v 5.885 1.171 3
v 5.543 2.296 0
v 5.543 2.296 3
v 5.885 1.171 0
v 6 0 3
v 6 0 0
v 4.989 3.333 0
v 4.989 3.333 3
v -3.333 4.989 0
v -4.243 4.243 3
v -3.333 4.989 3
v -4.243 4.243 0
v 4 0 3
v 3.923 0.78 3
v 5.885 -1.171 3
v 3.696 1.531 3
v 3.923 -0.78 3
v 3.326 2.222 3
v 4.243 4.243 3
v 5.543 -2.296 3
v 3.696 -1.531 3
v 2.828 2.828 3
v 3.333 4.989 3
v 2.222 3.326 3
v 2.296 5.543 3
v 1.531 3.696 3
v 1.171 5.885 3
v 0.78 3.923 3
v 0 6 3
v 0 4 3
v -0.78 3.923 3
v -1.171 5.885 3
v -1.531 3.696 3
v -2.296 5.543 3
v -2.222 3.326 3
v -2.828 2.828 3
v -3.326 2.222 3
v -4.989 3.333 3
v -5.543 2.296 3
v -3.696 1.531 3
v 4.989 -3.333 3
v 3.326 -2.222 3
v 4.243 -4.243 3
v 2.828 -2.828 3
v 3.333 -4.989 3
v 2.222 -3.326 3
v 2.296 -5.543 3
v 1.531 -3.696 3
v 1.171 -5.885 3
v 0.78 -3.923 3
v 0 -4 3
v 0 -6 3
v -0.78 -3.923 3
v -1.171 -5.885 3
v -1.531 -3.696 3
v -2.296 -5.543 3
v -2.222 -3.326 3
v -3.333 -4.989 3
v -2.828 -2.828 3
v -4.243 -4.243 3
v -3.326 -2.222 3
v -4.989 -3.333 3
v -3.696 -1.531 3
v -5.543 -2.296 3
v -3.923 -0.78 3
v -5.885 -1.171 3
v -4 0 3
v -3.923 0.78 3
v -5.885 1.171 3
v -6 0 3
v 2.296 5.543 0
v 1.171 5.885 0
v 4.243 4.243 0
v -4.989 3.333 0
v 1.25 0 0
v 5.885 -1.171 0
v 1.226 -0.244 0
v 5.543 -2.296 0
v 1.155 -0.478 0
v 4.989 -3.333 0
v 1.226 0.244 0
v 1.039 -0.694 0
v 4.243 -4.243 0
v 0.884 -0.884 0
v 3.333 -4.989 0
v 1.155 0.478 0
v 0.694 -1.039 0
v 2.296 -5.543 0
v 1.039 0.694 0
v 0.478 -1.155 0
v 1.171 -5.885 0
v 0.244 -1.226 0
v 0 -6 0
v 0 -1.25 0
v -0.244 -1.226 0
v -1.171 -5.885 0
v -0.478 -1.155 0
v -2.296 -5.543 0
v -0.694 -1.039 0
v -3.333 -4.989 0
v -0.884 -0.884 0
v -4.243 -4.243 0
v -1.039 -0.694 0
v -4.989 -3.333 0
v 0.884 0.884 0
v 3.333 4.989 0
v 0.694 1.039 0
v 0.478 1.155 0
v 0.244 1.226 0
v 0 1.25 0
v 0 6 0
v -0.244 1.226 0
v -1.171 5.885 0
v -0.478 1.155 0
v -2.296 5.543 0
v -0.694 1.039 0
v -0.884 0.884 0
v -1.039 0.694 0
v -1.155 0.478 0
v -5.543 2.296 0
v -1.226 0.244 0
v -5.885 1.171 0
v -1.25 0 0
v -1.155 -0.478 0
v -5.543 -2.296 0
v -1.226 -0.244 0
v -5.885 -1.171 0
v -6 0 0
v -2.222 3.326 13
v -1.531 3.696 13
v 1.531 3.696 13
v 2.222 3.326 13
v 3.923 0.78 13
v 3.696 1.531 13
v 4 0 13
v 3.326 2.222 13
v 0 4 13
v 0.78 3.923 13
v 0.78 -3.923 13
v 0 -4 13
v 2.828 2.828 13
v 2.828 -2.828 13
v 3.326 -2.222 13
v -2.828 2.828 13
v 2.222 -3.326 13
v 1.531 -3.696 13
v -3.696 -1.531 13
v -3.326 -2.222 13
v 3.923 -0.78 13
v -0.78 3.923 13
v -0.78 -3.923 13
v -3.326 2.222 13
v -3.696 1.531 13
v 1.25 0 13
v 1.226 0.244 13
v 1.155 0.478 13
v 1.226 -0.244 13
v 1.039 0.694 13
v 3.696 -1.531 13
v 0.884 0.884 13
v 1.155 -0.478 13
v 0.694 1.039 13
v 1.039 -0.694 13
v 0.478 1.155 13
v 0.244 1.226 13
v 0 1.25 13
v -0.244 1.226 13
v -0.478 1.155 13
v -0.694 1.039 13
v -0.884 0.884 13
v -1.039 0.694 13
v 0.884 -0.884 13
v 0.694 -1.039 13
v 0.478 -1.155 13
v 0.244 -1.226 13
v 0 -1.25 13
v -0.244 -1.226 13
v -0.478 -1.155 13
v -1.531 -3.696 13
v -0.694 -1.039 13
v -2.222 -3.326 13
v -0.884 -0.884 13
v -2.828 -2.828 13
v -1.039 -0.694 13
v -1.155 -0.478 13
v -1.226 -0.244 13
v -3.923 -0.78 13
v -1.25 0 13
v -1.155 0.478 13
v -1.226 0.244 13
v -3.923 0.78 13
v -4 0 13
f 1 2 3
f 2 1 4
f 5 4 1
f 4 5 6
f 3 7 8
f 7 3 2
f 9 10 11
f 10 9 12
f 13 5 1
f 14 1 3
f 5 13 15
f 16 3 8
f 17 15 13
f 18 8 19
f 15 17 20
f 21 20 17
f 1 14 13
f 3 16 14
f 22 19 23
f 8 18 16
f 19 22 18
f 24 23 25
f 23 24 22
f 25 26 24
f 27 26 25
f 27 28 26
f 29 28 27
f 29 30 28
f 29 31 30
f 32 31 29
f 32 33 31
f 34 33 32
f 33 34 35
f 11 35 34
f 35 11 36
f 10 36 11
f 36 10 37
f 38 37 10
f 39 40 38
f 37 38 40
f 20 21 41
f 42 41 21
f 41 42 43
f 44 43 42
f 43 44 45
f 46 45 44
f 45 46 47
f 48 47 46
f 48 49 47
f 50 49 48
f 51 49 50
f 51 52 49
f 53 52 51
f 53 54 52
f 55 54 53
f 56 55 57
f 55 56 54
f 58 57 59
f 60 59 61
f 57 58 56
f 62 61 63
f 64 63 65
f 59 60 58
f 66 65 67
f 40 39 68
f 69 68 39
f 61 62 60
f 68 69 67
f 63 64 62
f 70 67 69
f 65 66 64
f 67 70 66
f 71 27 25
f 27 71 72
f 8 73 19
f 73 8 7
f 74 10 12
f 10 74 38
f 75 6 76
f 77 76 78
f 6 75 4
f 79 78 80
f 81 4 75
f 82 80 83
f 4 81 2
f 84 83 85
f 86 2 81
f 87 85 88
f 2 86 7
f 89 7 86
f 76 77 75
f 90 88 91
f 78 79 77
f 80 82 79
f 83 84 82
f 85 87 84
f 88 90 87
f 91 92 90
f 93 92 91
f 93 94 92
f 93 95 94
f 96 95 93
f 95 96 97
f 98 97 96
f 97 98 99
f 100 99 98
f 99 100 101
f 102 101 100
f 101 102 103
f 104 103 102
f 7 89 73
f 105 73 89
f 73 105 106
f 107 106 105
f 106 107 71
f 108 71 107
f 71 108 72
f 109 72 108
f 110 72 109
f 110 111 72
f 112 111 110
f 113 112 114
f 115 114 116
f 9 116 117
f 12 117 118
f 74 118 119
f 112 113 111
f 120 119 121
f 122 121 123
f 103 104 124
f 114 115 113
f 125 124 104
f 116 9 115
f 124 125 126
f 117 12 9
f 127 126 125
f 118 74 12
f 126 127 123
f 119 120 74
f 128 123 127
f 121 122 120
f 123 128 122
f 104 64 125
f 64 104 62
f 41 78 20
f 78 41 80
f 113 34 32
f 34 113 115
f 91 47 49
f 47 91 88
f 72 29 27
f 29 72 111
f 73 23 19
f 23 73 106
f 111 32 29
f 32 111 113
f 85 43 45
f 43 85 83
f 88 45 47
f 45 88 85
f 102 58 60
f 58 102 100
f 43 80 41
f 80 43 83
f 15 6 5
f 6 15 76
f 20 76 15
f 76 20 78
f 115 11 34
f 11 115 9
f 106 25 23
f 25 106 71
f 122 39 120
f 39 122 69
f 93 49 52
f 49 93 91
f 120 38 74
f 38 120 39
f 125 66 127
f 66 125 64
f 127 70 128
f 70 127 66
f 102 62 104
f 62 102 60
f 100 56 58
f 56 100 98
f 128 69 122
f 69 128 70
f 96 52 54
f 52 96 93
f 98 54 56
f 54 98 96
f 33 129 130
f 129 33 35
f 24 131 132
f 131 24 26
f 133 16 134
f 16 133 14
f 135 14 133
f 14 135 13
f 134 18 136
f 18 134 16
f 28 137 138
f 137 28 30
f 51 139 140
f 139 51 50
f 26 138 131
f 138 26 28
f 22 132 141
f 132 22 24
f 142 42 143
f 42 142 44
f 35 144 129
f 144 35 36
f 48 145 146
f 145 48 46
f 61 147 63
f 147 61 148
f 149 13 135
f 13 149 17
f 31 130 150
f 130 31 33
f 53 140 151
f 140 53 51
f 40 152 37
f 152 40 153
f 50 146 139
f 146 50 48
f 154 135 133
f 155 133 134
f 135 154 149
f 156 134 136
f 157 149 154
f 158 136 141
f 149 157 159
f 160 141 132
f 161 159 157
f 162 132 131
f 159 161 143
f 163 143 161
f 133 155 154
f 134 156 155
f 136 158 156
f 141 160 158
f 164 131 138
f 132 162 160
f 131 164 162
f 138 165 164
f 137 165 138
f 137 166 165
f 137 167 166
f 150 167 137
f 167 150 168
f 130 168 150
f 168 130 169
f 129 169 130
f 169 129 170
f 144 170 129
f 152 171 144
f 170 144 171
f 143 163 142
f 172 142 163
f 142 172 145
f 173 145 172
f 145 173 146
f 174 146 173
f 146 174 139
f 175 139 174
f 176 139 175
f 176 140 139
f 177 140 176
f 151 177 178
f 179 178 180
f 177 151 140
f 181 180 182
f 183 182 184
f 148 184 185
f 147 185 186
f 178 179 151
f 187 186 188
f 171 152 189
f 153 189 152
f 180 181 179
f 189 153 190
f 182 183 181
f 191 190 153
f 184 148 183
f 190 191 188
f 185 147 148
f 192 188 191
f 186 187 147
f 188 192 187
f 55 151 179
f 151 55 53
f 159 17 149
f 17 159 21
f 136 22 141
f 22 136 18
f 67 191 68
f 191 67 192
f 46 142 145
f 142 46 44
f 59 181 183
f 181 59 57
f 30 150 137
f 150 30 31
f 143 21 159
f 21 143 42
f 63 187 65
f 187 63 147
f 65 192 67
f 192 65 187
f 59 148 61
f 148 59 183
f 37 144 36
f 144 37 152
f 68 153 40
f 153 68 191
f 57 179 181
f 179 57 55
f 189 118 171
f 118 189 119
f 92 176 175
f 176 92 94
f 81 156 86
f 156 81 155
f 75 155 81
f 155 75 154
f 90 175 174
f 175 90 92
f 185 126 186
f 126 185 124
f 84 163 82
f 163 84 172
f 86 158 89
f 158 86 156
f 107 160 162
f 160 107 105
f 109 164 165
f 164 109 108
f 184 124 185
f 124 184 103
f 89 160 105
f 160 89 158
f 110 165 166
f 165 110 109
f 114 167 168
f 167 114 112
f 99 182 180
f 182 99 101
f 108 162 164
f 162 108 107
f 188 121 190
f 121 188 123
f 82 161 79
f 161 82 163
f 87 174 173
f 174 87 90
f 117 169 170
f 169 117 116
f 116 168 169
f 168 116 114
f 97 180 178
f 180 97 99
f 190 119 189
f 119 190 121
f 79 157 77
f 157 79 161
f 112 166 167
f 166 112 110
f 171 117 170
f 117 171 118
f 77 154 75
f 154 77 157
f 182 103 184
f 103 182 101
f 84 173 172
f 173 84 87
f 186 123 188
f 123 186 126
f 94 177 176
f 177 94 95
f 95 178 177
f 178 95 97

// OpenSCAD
$fn = 32;

// ----------------------------------------------------------------------
// Micro post: flanged post, 5-20 mm class
// ----------------------------------------------------------------------

// --- parameters (mm) ---
post_d = 8;               // post diameter
post_h = 10;              // post height above the flange
flange_d = 12;            // flange diameter
flange_t = 3;             // flange thickness
bore_d = 2.5;             // through bore
fit_tol = 0.02;           // tolerance for press fits, mm
free_tol = 0.2;           // tolerance for clearance fits, mm

total_h = post_h + flange_t;  // overall height

difference() {
  union() {
    cylinder(h = flange_t, d = flange_d);
    translate([0, 0, flange_t]) cylinder(h = post_h, d = post_d);
  }
  translate([0, 0, -1]) cylinder(h = total_h + 2, d = bore_d);
}
